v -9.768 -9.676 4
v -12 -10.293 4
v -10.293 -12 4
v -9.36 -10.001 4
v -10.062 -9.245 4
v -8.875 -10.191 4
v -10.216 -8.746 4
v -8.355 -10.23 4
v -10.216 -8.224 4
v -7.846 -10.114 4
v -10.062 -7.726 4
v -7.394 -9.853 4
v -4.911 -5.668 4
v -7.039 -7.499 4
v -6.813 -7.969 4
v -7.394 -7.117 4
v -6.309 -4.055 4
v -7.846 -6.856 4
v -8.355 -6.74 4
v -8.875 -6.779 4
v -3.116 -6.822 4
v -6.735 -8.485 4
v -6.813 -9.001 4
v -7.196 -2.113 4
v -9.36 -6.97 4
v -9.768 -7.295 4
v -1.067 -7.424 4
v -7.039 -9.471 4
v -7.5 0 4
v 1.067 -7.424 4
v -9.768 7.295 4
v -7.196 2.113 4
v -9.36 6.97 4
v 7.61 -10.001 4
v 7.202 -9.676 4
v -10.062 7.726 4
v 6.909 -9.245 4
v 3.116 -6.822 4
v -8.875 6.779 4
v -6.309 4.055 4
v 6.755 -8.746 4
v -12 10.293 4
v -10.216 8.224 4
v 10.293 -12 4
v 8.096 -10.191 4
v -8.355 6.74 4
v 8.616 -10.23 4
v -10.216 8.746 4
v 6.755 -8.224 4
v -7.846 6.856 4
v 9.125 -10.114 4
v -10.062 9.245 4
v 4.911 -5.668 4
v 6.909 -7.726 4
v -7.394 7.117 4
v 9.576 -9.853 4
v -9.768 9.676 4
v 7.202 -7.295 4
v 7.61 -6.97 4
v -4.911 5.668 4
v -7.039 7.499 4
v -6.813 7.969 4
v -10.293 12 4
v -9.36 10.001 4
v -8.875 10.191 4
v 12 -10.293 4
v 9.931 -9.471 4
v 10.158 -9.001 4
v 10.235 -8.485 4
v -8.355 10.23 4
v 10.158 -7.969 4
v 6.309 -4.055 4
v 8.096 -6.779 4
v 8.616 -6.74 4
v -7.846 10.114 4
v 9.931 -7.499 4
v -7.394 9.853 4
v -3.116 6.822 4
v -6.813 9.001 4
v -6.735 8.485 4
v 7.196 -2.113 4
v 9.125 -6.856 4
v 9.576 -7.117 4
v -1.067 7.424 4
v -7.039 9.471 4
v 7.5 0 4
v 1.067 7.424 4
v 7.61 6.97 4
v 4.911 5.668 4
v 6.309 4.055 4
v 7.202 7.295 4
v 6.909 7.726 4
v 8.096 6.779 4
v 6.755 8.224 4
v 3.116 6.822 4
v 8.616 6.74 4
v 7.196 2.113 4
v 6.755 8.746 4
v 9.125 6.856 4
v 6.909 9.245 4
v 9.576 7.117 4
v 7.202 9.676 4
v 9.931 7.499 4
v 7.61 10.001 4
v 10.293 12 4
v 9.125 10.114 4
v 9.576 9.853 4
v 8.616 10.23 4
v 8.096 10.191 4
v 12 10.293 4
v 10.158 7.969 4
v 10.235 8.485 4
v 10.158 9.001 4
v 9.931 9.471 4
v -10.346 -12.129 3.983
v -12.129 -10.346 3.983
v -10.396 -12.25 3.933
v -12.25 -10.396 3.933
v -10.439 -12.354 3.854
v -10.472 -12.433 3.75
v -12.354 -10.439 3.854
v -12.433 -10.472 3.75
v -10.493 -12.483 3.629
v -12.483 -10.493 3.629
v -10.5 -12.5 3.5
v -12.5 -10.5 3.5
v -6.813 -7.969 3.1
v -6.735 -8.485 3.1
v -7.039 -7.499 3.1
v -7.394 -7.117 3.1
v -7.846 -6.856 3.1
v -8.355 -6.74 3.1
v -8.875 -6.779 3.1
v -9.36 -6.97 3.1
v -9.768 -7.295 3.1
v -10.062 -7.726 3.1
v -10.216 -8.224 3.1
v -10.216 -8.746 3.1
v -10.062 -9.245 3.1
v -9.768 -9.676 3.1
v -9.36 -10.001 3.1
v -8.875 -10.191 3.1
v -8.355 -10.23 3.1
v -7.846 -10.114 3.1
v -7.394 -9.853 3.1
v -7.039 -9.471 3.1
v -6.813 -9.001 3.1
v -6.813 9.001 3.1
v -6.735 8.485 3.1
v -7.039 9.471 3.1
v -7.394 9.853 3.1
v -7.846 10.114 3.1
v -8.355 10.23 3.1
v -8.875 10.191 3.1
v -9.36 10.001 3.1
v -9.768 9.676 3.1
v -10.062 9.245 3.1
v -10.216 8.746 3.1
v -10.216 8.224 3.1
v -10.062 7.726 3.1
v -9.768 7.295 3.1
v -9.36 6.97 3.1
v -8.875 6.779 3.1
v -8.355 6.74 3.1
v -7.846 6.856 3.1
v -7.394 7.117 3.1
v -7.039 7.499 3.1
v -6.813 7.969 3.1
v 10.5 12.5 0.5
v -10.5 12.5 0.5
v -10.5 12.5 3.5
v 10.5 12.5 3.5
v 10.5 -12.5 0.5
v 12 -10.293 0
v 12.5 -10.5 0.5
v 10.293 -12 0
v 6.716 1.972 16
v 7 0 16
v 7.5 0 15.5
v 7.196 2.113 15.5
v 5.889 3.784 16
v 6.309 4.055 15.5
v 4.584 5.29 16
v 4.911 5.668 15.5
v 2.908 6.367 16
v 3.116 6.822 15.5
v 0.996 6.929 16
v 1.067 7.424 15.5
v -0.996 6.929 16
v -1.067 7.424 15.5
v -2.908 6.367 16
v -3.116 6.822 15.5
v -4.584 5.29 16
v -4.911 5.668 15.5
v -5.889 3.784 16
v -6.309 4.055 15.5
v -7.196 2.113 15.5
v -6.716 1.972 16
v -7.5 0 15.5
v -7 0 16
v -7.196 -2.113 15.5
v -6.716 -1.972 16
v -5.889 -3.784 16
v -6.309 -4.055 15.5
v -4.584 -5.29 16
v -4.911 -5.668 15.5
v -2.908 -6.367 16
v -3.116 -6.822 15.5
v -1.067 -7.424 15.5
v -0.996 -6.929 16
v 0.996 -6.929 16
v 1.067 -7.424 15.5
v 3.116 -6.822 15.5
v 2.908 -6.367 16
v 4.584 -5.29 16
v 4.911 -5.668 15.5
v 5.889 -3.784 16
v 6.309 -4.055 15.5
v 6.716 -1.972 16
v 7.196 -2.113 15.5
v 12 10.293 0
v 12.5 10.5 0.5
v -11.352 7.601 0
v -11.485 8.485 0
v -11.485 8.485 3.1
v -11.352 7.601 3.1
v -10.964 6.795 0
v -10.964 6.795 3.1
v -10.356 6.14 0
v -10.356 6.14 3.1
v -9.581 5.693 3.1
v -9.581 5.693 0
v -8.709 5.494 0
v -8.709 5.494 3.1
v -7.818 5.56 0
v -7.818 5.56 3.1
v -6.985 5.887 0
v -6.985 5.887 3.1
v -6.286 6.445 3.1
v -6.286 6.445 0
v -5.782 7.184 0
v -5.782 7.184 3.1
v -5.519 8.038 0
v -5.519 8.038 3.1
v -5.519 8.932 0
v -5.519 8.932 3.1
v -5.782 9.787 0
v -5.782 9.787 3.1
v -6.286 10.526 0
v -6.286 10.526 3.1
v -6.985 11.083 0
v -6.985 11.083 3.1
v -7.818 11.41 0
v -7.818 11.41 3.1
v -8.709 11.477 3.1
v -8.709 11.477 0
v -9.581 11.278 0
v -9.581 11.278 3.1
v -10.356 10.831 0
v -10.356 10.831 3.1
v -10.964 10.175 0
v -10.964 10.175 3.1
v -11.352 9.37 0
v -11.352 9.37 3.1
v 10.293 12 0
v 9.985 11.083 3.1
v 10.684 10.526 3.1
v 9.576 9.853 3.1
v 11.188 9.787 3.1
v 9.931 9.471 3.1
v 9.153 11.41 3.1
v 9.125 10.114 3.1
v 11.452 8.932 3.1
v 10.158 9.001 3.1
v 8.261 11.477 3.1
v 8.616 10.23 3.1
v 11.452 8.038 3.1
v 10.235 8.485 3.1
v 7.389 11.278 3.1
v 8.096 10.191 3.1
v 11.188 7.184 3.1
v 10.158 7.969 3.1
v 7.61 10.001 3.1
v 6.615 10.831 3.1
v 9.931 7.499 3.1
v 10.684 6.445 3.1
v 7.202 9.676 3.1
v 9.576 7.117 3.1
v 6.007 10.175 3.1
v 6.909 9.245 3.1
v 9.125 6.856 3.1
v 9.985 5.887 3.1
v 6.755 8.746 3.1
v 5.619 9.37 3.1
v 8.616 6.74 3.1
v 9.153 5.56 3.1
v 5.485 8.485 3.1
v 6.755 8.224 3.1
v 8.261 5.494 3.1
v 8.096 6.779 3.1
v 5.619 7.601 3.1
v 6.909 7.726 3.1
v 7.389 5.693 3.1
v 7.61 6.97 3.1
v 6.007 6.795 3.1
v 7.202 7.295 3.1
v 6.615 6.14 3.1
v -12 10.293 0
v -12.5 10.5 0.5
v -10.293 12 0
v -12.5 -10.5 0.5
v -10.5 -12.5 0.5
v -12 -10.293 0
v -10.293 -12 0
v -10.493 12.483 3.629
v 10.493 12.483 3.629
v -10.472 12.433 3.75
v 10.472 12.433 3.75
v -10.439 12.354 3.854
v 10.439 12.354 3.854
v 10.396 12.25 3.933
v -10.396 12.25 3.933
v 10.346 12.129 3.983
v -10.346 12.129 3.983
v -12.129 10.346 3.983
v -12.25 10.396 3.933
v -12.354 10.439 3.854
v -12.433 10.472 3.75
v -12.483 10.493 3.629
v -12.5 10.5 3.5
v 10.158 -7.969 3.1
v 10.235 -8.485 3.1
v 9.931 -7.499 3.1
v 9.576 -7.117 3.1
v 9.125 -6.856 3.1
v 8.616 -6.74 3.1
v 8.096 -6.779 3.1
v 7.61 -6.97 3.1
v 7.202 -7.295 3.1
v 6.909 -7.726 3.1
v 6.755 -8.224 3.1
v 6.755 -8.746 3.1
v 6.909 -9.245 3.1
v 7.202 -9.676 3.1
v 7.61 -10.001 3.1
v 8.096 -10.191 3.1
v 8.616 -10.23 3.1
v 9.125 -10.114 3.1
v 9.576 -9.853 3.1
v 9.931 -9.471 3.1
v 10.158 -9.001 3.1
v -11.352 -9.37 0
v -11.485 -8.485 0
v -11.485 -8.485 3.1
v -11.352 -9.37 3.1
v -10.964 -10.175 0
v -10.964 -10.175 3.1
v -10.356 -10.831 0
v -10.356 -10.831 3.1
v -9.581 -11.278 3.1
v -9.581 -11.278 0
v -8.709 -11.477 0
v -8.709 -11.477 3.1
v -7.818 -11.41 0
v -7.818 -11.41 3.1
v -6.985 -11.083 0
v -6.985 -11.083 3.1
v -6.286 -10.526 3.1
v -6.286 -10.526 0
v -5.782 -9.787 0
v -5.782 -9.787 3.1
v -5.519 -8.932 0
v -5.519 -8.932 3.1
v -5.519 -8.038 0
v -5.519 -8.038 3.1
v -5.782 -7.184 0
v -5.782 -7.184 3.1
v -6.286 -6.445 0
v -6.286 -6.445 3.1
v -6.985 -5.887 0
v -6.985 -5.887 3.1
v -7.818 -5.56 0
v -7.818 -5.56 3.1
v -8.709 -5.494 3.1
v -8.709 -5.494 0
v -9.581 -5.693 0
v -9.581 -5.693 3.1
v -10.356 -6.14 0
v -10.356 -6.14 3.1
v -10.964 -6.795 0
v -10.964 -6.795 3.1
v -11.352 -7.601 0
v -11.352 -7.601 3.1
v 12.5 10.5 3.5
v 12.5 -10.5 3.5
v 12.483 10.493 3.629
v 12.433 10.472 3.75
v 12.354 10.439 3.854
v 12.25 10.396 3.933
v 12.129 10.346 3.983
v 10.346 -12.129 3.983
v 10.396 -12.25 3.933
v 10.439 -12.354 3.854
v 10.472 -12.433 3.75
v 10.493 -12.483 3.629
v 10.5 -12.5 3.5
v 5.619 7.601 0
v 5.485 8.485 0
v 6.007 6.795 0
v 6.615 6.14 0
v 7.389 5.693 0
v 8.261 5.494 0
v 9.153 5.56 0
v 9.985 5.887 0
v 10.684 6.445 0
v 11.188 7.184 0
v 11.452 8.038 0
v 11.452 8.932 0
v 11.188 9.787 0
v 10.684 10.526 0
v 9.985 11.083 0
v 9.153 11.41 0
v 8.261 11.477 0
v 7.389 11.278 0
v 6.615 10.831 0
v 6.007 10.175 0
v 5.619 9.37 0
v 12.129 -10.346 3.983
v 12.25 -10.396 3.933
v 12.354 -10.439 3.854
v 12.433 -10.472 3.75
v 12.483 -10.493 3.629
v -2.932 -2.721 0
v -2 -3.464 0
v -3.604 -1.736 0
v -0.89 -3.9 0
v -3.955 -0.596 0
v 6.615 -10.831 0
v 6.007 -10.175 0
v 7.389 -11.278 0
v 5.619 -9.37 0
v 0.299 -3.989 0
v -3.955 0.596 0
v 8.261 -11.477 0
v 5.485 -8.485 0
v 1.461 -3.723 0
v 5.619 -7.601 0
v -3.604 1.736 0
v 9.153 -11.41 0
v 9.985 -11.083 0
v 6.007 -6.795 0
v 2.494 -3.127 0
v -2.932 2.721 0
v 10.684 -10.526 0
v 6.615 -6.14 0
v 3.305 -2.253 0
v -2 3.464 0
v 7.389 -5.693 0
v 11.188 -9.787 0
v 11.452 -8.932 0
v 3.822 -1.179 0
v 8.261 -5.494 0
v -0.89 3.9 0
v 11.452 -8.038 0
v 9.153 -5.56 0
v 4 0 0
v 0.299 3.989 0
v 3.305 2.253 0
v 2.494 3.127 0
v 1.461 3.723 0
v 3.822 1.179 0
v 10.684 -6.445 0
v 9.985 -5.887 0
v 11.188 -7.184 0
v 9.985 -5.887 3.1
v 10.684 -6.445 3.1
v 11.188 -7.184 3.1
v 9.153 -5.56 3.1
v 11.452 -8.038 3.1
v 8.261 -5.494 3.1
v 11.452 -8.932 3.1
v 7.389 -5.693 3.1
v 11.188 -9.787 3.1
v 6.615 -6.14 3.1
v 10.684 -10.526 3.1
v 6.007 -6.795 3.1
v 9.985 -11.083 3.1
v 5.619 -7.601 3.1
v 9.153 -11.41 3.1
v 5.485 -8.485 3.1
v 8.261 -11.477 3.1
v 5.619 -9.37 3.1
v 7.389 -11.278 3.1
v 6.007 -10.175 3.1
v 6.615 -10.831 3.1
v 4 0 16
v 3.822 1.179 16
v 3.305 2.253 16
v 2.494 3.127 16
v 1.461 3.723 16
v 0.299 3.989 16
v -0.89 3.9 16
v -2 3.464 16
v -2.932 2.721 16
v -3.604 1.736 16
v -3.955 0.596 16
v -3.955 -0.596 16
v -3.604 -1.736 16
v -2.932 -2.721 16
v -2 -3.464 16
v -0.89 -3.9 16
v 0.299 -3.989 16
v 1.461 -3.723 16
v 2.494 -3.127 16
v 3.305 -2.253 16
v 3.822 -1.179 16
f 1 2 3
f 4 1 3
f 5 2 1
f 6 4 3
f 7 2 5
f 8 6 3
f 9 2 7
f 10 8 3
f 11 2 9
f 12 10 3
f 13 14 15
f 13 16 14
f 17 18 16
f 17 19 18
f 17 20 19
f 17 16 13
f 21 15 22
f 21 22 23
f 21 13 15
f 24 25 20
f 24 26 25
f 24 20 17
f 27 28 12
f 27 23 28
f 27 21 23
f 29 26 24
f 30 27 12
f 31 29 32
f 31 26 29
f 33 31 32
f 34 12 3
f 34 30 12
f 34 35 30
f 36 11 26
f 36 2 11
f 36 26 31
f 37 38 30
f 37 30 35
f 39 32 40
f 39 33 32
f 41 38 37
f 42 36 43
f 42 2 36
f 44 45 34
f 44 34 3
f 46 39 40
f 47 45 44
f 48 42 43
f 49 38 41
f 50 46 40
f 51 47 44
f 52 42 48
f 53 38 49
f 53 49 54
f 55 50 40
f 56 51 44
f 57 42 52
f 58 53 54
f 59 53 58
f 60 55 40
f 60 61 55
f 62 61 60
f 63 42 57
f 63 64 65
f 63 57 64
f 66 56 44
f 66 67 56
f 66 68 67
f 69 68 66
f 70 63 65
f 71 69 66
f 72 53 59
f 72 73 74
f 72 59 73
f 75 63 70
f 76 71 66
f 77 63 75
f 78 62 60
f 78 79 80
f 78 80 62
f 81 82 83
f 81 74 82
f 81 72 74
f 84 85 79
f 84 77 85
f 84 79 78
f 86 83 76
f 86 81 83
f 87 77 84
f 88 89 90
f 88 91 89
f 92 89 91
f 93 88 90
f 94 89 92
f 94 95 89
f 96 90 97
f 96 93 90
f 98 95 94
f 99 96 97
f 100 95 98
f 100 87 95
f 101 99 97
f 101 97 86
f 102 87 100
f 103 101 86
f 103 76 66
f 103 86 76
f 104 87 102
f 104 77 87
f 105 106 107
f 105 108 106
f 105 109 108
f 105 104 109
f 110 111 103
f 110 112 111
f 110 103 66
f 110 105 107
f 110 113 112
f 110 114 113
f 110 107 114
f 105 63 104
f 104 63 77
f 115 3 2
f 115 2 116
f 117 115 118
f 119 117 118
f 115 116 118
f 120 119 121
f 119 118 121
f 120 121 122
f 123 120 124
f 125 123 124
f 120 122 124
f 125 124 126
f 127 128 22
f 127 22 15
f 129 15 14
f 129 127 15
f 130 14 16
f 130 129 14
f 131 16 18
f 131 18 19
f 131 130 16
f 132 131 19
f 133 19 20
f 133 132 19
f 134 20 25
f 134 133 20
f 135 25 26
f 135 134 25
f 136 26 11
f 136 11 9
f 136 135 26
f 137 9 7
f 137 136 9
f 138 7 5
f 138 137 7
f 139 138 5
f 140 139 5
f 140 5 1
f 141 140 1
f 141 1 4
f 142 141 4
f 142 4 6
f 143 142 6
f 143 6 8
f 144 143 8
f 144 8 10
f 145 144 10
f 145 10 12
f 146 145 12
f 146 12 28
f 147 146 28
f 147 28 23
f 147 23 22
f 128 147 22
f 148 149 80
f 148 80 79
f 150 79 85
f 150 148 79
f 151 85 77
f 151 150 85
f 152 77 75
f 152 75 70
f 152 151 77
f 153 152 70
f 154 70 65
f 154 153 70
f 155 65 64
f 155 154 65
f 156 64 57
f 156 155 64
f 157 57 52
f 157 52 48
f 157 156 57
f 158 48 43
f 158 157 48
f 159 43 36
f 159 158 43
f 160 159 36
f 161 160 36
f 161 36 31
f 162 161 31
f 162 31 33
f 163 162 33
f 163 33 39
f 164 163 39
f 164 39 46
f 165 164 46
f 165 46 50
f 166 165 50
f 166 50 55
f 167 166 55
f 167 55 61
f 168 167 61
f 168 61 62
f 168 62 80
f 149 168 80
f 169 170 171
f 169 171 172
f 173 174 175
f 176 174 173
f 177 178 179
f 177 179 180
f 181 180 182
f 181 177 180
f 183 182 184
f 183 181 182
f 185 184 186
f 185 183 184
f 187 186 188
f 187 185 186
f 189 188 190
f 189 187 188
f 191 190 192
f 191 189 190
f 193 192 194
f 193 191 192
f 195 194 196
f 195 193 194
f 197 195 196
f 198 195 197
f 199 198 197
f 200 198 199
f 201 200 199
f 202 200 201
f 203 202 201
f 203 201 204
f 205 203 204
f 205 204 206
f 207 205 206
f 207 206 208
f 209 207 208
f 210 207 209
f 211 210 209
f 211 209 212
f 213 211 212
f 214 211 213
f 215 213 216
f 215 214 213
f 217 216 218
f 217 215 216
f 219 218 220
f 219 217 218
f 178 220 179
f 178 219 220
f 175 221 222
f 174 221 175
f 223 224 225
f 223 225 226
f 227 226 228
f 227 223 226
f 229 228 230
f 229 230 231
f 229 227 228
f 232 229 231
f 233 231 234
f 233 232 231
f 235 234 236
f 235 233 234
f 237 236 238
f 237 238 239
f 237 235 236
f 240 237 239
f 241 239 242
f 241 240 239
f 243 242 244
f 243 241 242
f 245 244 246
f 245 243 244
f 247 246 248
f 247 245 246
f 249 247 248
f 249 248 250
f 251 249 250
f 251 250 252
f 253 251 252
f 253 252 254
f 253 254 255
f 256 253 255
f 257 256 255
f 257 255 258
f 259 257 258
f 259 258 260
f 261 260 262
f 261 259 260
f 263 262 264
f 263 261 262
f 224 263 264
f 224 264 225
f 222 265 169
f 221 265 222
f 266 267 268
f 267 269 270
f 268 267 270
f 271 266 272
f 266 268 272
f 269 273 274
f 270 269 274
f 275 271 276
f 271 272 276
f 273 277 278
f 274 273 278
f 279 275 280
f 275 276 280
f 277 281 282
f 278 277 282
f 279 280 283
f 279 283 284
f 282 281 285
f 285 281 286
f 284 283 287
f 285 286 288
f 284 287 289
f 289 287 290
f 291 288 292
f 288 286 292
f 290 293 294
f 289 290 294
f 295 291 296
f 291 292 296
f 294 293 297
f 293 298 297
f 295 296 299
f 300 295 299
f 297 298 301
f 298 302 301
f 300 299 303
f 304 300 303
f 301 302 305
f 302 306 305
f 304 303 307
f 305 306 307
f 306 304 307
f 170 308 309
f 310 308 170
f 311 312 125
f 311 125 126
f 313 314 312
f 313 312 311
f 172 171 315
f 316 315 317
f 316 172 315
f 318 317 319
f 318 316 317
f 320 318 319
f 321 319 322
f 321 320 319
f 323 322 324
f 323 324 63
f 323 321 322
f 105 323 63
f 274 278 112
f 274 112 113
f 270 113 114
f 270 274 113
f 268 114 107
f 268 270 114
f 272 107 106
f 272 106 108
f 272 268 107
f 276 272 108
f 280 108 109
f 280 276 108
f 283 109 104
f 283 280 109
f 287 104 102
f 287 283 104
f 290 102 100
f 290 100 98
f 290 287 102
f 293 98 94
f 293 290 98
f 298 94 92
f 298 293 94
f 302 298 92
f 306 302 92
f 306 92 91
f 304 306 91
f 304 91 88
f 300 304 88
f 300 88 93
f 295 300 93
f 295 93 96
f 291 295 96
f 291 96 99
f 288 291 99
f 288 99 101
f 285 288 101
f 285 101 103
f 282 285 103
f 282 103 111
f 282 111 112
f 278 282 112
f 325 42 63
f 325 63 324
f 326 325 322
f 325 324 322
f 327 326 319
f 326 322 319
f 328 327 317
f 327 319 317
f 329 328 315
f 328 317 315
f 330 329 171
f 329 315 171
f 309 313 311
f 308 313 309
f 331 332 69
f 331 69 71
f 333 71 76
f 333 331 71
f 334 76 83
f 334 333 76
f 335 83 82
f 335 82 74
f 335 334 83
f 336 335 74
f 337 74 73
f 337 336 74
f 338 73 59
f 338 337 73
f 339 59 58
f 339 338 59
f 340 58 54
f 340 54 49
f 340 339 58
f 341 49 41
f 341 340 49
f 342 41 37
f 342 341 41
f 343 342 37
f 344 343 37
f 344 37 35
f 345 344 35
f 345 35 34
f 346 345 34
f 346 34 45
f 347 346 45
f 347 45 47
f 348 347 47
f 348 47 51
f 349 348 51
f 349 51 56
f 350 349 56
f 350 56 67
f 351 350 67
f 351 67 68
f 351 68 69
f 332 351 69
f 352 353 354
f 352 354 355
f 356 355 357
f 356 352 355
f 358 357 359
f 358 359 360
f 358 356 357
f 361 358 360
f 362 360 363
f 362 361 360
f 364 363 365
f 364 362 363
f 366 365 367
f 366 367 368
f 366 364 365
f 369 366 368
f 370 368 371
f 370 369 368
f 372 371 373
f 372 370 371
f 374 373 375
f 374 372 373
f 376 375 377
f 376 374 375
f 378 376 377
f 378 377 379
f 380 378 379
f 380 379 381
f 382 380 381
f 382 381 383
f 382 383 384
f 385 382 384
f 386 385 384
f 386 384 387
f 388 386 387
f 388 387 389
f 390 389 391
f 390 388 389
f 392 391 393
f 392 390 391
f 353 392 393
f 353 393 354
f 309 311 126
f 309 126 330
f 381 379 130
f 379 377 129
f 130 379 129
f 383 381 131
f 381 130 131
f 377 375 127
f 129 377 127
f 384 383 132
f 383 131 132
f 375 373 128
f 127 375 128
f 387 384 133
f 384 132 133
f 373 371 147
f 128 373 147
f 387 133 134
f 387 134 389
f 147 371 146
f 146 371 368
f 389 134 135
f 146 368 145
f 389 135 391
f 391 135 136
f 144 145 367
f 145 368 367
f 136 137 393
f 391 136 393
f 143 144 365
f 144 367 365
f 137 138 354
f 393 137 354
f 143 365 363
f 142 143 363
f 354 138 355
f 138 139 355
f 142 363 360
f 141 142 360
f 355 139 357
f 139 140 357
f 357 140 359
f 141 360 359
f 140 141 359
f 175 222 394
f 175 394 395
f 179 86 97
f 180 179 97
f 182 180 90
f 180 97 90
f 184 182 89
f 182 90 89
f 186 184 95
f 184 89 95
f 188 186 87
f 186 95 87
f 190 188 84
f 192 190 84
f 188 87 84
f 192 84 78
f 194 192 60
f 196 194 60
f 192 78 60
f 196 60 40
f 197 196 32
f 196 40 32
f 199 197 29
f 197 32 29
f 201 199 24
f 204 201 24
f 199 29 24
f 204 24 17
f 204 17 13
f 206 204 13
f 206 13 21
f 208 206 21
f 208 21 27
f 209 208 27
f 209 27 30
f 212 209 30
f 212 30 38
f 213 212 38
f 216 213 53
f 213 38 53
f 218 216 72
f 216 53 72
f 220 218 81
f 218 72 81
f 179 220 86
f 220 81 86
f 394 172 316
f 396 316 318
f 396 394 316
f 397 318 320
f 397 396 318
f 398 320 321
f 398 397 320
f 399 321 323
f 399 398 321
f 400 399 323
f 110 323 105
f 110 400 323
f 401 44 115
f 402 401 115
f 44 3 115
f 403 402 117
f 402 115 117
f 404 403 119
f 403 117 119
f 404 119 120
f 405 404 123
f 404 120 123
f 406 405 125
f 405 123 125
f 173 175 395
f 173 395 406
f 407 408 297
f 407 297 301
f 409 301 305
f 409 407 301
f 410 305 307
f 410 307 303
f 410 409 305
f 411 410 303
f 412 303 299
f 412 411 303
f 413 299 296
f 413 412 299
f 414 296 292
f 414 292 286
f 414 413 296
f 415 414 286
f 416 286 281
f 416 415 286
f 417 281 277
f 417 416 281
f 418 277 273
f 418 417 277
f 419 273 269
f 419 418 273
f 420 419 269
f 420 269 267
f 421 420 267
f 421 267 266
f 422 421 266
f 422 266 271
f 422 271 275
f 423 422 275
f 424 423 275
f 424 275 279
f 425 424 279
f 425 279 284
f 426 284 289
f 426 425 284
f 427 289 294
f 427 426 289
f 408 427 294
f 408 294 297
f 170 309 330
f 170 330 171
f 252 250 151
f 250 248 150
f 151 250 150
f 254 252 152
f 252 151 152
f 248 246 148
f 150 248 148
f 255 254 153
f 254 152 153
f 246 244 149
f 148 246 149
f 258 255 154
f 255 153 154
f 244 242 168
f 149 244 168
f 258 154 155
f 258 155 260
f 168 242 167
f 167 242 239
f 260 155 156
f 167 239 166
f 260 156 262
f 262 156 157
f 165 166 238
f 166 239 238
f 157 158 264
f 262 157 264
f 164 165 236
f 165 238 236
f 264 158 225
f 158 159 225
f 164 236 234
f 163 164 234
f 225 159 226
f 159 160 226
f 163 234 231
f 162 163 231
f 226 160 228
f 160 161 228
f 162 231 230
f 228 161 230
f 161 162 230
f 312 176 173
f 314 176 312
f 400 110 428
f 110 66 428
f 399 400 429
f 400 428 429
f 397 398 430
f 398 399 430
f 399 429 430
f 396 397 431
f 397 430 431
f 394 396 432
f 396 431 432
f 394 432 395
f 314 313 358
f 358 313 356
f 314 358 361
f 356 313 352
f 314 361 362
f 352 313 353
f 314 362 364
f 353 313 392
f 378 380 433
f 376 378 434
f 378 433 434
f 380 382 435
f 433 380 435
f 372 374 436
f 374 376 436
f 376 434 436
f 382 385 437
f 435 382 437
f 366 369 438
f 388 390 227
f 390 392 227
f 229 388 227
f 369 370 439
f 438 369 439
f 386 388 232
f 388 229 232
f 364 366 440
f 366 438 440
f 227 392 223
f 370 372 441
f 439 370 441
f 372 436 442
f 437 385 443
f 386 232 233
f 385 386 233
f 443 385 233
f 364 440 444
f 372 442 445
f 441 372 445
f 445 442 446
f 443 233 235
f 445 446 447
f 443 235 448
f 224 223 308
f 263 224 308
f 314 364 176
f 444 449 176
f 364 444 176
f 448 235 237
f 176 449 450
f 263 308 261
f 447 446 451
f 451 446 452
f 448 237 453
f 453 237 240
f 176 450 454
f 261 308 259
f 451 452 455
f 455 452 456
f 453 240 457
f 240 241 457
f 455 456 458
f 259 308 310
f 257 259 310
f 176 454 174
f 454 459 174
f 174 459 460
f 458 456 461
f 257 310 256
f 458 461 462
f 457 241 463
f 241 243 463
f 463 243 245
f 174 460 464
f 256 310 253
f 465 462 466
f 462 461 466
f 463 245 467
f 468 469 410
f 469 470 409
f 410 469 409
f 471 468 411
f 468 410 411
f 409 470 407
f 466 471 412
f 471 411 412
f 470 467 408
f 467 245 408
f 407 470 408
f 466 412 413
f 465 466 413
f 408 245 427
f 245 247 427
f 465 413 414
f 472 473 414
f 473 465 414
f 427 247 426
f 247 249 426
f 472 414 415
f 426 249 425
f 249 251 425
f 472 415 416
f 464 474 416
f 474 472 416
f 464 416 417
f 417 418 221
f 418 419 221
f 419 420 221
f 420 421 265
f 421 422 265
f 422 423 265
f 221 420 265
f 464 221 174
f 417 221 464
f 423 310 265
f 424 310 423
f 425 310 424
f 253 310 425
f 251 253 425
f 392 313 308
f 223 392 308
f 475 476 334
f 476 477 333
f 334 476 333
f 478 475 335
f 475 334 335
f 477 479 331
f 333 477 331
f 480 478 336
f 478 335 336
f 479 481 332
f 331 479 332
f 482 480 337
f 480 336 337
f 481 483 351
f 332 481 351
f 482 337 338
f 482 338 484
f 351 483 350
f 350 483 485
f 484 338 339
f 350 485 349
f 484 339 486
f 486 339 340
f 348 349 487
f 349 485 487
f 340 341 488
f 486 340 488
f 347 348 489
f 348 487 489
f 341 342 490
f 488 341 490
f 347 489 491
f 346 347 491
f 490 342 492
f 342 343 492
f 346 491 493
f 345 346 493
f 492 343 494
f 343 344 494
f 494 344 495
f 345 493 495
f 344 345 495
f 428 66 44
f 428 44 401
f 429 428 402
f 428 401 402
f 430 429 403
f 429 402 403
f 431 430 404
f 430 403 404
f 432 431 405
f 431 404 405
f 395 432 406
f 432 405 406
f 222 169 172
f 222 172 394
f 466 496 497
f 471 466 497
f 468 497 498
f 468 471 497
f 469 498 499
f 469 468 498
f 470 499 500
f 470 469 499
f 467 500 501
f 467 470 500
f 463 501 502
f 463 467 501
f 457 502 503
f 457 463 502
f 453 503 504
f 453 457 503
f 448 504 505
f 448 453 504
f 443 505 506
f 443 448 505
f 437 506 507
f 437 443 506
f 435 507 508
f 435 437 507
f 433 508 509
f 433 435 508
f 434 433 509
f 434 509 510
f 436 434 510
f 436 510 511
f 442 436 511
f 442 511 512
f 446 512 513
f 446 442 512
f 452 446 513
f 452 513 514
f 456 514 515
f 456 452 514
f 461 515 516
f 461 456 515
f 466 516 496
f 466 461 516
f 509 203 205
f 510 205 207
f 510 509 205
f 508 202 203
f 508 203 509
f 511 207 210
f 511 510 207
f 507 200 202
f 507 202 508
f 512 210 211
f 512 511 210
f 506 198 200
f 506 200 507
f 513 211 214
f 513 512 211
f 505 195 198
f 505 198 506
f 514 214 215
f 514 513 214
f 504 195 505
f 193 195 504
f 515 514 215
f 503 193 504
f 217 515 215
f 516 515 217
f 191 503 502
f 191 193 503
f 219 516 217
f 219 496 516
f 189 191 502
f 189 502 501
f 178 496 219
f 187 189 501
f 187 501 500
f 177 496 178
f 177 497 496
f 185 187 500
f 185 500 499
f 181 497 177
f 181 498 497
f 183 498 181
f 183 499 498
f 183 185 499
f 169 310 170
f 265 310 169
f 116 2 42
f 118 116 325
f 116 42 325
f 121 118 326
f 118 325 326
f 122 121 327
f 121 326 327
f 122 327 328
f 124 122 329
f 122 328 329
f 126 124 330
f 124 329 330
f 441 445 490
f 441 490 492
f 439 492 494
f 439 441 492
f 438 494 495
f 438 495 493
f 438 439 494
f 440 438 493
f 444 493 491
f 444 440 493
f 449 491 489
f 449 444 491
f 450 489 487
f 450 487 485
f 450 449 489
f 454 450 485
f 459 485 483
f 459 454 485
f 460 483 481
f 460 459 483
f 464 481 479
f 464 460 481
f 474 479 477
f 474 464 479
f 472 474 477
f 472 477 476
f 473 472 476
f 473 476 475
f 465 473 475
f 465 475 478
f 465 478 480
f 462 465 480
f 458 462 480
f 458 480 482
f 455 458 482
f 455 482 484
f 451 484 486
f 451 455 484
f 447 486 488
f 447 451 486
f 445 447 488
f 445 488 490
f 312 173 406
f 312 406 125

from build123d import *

# Parameters (mm, degrees)
SKETCH_1_R          = 4
SKETCH_1_R_2        = 1.75
EXTRUDE_1_DEPTH     = 4
SKETCH_1_3_R        = 3
SKETCH_1_3_R_2      = 1.75
CUT_EXTRUDE_1_DEPTH = 3.1
SKETCH_2_R          = 7.5
SKETCH_2_R_2        = 4
EXTRUDE_2_DEPTH     = 12
CHAMFER_1_SIZE      = 0.5
CHAMFER_2_SIZE      = 0.5
FILLET_1_R          = 0.5


with BuildPart() as part:
    # 스케치1 → 보스-돌출1 (new body)
    with BuildSketch(Plane.XY):
        Polygon((-10.5, 12.5), (-12.5, 10.5), (-12.5, -10.5), (-10.5, -12.5), (10.5, -12.5), (12.5, -10.5), (12.5, 10.5), (10.5, 12.5), align=None)
        Circle(SKETCH_1_R, mode=Mode.SUBTRACT)
        with Locations((-8.485281374, -8.485281374)):
            Circle(SKETCH_1_R_2, mode=Mode.SUBTRACT)
        with Locations((8.485281374, -8.485281374)):
            Circle(SKETCH_1_R_2, mode=Mode.SUBTRACT)
        with Locations((-8.485281374, 8.485281374)):
            Circle(SKETCH_1_R_2, mode=Mode.SUBTRACT)
        with Locations((8.485281374, 8.485281374)):
            Circle(SKETCH_1_R_2, mode=Mode.SUBTRACT)
    extrude(amount=EXTRUDE_1_DEPTH)

    # 스케치1<3> → 컷-돌출1 (cut)
    # profile 1 of 4: a face of its own
    with BuildSketch(Plane.XY):
        with Locations((-8.485281374, 8.485281374)):
            Circle(SKETCH_1_3_R)
        with Locations((-8.485281374, 8.485281374)):
            Circle(SKETCH_1_3_R_2, mode=Mode.SUBTRACT)
    # profile 2 of 4: a face of its own
    with BuildSketch(Plane.XY):
        with Locations((-8.485281374, -8.485281374)):
            Circle(SKETCH_1_3_R)
        with Locations((-8.485281374, -8.485281374)):
            Circle(SKETCH_1_3_R_2, mode=Mode.SUBTRACT)
    # profile 3 of 4: a face of its own
    with BuildSketch(Plane.XY):
        with Locations((8.485281374, -8.485281374)):
            Circle(SKETCH_1_3_R)
        with Locations((8.485281374, -8.485281374)):
            Circle(SKETCH_1_3_R_2, mode=Mode.SUBTRACT)
    # profile 4 of 4: a face of its own
    with BuildSketch(Plane.XY):
        with Locations((8.485281374, 8.485281374)):
            Circle(SKETCH_1_3_R)
        with Locations((8.485281374, 8.485281374)):
            Circle(SKETCH_1_3_R_2, mode=Mode.SUBTRACT)
    extrude(amount=CUT_EXTRUDE_1_DEPTH, mode=Mode.SUBTRACT)

    # 스케치2 → 보스-돌출2 (add)
    with BuildSketch(Plane.XY.offset(4)):
        Circle(SKETCH_2_R)
        Circle(SKETCH_2_R_2, mode=Mode.SUBTRACT)
    extrude(amount=EXTRUDE_2_DEPTH)

    # 모따기1
    chamfer_1_edges = [part.edges().sort_by_distance(p)[0] for p in [
        (-7.5, 0, 16),
    ]]
    chamfer(chamfer_1_edges, length=CHAMFER_1_SIZE)

    # 모따기2
    chamfer_2_edges = [part.edges().sort_by_distance(p)[0] for p in [
        (-11.5, 11.5, 0),
        (-12.5, 0, 0),
        (-11.5, -11.5, 0),
        (0, -12.5, 0),
        (11.5, -11.5, 0),
        (12.5, 0, 0),
        (11.5, 11.5, 0),
        (0, 12.5, 0),
    ]]
    chamfer(chamfer_2_edges, length=CHAMFER_2_SIZE)

    # 필렛1
    fillet_1_edges = [part.edges().sort_by_distance(p)[0] for p in [
        (-11.5, -11.5, 4),
        (0, -12.5, 4),
        (11.5, -11.5, 4),
        (11.5, 11.5, 4),
        (12.5, 0, 4),
        (-12.5, 0, 4),
        (-11.5, 11.5, 4),
        (0, 12.5, 4),
    ]]
    fillet(fillet_1_edges, radius=FILLET_1_R)


solid = part.part
